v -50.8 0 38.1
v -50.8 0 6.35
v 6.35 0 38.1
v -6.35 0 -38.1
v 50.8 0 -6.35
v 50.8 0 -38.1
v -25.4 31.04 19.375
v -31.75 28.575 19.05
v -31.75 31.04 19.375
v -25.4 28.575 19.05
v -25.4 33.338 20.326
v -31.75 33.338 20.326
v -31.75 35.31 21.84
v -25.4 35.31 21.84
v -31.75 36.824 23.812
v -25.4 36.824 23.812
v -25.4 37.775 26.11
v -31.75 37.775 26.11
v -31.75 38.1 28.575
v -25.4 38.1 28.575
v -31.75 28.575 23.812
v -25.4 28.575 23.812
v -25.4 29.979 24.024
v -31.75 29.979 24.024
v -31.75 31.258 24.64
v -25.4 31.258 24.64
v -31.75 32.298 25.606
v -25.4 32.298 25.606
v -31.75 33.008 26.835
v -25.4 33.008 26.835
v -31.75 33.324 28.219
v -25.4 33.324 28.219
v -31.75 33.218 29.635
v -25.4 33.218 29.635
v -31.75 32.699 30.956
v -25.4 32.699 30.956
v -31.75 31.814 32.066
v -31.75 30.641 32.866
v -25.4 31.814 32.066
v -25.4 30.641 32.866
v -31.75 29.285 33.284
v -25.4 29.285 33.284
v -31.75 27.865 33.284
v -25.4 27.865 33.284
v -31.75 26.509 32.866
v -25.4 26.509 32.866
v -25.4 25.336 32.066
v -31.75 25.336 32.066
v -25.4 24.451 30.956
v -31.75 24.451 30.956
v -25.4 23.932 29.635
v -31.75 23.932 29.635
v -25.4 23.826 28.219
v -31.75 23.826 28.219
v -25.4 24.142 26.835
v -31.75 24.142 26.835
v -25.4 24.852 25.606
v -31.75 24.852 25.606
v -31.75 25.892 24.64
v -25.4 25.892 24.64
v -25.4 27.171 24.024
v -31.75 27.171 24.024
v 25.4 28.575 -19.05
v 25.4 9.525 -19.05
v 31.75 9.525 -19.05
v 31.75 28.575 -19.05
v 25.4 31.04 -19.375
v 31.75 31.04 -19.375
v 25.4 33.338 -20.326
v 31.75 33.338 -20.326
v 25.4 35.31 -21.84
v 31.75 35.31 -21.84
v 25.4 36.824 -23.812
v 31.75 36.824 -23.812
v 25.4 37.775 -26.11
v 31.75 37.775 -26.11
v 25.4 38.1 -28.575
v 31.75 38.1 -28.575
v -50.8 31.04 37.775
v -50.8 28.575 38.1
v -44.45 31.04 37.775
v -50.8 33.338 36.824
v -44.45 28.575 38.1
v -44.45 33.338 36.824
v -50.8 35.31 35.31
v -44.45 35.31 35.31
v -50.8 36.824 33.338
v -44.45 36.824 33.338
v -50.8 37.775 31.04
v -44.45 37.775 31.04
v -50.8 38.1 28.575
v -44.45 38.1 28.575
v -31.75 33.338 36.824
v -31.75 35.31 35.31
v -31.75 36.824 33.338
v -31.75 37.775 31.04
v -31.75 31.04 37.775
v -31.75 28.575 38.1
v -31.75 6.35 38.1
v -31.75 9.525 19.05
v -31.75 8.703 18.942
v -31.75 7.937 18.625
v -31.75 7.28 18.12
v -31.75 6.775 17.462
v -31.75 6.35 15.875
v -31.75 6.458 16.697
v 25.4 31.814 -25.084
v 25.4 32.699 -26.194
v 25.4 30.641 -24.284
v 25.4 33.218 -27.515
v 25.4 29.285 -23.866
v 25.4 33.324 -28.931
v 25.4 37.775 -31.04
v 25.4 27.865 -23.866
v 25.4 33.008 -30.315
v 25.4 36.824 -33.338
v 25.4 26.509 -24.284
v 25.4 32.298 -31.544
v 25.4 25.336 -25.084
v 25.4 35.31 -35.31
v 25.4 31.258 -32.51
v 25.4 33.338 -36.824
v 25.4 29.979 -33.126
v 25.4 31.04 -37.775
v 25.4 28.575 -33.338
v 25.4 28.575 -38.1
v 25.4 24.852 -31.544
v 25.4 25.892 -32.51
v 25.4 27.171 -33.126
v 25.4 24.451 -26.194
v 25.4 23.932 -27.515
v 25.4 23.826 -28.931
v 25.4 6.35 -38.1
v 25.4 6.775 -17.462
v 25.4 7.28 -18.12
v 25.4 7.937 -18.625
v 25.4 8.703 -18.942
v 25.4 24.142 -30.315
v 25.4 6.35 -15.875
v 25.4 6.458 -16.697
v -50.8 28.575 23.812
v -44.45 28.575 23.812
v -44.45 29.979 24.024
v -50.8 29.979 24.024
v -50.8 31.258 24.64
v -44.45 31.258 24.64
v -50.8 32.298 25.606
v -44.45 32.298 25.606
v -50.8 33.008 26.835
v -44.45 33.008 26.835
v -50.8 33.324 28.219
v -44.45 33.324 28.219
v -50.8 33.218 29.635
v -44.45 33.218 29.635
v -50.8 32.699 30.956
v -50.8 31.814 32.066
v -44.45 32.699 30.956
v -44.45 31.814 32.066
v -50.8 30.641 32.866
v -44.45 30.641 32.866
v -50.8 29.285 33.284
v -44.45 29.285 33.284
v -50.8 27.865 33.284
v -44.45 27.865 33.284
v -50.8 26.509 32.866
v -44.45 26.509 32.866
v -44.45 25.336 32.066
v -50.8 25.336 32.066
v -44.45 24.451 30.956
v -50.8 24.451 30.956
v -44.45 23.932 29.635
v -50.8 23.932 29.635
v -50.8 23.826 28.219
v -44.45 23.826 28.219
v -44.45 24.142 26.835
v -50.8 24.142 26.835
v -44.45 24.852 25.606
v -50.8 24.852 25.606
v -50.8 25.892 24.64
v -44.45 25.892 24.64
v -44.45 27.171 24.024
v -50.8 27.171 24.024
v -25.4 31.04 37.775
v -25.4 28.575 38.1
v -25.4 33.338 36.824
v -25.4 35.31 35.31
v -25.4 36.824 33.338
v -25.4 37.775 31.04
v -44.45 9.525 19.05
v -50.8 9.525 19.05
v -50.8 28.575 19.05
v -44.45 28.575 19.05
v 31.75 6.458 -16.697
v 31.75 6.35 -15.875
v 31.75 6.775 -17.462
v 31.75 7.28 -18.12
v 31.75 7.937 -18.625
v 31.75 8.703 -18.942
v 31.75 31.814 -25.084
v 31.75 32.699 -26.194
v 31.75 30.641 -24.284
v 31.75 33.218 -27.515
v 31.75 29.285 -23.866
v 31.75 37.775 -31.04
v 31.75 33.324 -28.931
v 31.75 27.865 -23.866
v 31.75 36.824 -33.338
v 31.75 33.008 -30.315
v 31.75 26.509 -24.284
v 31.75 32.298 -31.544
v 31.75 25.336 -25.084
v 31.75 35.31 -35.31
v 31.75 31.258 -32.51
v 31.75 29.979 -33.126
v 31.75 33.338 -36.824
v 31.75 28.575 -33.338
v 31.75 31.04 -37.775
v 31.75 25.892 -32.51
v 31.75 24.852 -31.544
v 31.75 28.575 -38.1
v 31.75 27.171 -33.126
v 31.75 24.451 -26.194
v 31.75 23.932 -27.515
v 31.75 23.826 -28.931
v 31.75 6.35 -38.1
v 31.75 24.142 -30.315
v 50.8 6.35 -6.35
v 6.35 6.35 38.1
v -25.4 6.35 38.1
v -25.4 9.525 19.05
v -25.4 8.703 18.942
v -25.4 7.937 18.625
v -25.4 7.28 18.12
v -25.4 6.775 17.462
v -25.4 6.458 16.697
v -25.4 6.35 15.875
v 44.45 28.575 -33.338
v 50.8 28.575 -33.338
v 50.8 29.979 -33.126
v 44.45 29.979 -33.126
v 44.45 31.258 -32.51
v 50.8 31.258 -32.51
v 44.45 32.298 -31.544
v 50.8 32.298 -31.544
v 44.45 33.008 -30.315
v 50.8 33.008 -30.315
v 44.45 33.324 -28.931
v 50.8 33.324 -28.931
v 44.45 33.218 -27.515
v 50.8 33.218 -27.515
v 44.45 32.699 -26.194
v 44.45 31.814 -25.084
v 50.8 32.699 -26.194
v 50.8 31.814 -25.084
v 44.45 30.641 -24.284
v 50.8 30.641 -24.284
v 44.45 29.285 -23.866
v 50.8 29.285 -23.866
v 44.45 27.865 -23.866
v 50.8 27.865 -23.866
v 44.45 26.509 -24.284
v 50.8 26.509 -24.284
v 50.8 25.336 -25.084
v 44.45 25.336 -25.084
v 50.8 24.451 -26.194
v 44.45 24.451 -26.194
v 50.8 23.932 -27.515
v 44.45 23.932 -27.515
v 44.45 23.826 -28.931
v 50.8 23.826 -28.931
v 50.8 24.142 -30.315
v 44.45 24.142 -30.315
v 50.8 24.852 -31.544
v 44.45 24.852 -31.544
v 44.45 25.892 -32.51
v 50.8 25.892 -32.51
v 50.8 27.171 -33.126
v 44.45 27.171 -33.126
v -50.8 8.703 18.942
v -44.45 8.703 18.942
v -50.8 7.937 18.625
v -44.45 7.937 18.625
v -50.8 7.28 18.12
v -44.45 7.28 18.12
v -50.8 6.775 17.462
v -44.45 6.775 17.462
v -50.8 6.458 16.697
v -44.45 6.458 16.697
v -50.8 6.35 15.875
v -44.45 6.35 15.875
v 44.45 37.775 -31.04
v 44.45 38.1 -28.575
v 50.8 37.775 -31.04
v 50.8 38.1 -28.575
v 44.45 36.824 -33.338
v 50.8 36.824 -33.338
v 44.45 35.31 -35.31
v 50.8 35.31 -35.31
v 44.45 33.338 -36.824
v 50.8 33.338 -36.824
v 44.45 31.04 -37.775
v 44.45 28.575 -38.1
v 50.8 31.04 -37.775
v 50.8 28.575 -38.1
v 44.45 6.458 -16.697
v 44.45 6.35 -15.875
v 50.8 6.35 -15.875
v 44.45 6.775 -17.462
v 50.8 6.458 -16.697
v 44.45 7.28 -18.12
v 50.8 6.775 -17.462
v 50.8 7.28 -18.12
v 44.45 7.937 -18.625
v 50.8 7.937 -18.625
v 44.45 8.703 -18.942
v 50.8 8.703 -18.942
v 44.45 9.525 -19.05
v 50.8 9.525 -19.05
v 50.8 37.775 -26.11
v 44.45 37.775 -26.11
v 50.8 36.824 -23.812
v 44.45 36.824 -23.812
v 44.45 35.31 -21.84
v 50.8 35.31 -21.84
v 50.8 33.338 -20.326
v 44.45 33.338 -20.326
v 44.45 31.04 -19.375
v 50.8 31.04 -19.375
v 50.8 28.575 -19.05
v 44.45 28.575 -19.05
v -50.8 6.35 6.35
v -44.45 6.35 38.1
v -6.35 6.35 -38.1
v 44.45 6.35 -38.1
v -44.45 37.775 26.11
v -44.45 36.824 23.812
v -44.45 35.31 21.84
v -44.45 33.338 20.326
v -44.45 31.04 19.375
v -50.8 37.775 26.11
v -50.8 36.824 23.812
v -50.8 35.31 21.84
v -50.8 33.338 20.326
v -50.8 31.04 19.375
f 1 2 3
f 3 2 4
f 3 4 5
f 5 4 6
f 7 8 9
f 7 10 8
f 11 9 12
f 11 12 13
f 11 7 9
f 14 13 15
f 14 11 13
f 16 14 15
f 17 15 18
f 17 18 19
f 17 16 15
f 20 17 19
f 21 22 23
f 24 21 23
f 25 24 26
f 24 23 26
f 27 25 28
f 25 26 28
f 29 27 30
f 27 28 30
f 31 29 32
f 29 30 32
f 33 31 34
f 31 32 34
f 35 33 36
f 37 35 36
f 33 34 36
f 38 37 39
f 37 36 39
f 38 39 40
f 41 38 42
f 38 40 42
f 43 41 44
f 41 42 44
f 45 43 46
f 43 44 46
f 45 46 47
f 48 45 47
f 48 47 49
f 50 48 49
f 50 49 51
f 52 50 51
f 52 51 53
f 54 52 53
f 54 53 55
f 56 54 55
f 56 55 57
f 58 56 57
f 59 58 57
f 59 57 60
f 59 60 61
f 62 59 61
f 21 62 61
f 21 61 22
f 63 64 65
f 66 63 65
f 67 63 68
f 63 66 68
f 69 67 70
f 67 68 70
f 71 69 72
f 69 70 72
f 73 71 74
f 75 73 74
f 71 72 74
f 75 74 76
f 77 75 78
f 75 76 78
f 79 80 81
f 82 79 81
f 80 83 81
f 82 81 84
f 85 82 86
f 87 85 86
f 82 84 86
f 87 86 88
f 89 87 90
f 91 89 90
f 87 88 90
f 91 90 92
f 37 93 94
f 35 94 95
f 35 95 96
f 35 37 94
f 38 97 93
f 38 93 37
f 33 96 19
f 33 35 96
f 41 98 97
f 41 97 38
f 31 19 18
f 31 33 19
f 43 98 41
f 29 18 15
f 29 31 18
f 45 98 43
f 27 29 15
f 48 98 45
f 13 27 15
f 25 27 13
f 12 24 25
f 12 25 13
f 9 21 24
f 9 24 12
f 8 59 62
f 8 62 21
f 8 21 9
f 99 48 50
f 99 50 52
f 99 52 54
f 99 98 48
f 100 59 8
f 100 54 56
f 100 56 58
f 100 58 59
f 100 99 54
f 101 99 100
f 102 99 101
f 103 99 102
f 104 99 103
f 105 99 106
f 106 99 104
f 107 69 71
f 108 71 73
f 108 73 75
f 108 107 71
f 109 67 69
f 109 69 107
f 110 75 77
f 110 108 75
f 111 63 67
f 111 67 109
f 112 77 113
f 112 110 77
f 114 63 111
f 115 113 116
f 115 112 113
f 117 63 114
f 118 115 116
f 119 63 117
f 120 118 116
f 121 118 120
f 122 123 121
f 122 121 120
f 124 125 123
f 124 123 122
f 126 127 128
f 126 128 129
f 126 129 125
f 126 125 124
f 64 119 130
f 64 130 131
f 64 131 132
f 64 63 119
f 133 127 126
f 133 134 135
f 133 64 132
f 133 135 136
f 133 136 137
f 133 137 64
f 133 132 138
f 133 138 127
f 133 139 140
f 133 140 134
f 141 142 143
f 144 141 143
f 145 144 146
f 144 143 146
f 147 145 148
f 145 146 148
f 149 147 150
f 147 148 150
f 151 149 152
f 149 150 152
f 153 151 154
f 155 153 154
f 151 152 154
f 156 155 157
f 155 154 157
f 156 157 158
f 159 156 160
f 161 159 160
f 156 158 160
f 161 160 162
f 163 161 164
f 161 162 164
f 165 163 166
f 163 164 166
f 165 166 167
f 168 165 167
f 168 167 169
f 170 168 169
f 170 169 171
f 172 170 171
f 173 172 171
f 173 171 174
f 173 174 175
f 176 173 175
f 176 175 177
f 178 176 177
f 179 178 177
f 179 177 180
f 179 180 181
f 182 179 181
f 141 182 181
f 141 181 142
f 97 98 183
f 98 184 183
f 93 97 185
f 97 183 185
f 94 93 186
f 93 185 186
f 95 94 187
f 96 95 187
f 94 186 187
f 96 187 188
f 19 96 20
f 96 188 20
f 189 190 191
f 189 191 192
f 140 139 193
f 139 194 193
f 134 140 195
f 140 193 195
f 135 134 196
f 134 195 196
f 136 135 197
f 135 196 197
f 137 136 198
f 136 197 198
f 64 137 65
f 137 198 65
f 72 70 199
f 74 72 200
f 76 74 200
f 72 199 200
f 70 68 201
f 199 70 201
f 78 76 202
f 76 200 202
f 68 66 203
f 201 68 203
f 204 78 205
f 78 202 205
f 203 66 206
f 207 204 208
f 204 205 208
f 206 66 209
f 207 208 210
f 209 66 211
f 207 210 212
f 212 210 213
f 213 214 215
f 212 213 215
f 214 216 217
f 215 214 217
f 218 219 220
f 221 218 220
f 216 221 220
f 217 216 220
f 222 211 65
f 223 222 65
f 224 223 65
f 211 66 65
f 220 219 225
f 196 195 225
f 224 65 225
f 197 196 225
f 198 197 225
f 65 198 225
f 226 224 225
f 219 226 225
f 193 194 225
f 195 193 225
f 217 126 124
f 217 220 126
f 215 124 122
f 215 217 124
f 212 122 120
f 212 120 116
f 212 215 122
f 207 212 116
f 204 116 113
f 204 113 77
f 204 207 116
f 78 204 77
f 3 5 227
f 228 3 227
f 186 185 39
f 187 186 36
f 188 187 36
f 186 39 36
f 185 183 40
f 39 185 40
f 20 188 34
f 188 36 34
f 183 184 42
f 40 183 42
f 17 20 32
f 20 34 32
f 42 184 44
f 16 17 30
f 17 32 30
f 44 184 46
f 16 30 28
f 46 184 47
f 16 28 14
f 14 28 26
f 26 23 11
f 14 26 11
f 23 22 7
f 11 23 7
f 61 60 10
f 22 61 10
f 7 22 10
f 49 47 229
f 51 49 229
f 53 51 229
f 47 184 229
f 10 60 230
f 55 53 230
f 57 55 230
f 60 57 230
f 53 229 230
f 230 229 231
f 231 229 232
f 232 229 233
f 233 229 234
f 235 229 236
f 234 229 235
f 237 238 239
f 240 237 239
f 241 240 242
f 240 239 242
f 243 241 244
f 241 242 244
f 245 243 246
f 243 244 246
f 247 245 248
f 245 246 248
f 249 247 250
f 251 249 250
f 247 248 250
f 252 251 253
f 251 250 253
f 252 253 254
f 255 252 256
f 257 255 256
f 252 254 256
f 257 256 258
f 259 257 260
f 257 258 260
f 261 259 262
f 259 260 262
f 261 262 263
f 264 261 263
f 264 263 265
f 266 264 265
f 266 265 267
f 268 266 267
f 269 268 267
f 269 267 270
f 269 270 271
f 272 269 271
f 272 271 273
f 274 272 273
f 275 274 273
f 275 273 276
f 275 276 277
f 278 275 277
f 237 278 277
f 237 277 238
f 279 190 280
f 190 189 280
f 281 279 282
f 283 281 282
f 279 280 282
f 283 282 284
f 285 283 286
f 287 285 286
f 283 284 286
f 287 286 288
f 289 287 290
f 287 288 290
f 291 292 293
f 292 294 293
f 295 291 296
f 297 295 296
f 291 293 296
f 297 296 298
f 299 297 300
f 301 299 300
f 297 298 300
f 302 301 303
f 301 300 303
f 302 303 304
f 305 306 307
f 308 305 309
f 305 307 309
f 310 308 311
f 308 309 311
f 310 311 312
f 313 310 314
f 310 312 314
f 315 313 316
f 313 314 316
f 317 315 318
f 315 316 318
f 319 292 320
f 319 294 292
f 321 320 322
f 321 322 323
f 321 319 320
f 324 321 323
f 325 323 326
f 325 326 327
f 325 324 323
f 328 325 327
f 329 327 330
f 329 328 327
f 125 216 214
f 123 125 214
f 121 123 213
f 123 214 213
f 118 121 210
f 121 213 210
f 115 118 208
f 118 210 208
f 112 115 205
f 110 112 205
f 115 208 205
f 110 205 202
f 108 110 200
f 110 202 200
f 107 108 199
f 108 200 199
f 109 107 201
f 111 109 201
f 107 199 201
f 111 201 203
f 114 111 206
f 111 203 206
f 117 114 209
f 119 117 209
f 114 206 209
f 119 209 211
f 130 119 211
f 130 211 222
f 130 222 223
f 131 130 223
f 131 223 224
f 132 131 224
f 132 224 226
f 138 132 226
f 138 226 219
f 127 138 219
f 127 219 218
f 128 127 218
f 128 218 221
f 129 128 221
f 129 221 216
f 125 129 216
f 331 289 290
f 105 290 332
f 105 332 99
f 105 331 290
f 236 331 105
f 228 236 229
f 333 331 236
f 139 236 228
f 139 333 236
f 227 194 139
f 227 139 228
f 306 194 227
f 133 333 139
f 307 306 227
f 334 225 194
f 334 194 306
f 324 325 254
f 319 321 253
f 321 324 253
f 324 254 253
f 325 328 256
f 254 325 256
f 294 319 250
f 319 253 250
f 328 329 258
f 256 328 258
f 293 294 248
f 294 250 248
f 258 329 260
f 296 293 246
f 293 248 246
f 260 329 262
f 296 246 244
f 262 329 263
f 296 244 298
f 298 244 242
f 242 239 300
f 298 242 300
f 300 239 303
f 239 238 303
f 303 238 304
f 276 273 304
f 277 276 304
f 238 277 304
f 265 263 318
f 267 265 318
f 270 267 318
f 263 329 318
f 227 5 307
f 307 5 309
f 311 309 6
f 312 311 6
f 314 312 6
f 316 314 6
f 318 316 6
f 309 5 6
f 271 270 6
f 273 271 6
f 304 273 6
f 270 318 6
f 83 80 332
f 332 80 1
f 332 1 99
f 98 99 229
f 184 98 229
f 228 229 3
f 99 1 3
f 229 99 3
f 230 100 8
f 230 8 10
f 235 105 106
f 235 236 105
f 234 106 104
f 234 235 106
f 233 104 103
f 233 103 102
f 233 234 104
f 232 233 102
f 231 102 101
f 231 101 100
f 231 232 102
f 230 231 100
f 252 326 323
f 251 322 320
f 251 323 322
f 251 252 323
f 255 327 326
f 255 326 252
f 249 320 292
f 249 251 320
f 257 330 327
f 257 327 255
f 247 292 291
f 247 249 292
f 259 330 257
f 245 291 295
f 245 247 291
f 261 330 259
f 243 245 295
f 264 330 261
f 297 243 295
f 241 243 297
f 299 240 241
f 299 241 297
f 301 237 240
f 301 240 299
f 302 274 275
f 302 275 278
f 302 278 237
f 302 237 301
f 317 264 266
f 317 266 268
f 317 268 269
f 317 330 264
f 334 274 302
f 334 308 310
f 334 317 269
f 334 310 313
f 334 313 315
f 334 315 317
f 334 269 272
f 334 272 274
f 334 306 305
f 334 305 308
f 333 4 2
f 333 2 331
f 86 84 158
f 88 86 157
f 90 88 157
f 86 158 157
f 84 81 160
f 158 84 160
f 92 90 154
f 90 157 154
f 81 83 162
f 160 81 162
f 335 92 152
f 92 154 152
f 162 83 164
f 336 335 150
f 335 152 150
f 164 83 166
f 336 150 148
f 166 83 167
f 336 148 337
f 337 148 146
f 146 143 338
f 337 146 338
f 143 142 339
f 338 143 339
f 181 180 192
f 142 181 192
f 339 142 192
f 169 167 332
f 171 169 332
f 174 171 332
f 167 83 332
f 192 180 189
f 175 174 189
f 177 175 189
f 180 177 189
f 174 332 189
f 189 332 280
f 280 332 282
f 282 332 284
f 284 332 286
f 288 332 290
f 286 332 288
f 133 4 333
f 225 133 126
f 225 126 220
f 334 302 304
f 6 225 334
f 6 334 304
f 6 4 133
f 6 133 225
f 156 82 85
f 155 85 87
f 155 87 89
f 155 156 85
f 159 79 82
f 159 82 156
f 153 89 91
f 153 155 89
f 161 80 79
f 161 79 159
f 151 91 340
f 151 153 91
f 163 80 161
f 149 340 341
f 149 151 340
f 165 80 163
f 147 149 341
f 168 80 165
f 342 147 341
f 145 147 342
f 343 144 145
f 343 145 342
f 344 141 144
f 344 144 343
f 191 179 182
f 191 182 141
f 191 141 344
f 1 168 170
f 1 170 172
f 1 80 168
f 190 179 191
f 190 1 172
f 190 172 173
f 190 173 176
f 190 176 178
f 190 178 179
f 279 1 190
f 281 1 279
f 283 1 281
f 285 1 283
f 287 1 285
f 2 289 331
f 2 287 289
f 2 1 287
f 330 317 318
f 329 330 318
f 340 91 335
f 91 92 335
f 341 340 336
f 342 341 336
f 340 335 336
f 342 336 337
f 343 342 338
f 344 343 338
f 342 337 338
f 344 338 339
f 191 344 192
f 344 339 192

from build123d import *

# Parameters (mm, degrees)
SKETCH1_W           = 101.6
SKETCH1_H           = 76.2
BOSS_EXTRUDE1_DEPTH = 6.35
SKETCH2_W           = 6.35
SKETCH2_H           = 19.05
BOSS_EXTRUDE2_DEPTH = 31.75
SKETCH3_R           = 4.7625
CUT_EXTRUDE1_DEPTH  = 116.003391254
FILLET1_R           = 3.175
FILLET2_R           = 9.525
CHAMFER1_SIZE       = 44.45


with BuildPart() as part:
    # Sketch1 → Boss-Extrude1 (new body)
    with BuildSketch(Plane(origin=(0, 0, 0), x_dir=(1, 0, 0), z_dir=(0, 1, 0))):
        Rectangle(SKETCH1_W, SKETCH1_H)
    extrude(amount=BOSS_EXTRUDE1_DEPTH)

    # Sketch2 → Boss-Extrude2 (add)
    with BuildSketch(Plane(origin=(0, 6.35, 0), x_dir=(1, 0, 0), z_dir=(0, 1, 0))):
        with Locations((-47.625, -28.575)):
            Rectangle(SKETCH2_W, SKETCH2_H)
        with Locations((-28.575, -28.575)):
            Rectangle(SKETCH2_W, SKETCH2_H)
        with Locations((28.575, 28.575)):
            Rectangle(SKETCH2_W, SKETCH2_H)
        with Locations((47.625, 28.575)):
            Rectangle(SKETCH2_W, SKETCH2_H)
    extrude(amount=BOSS_EXTRUDE2_DEPTH)

    # Sketch3 → Cut-Extrude1 (cut, through all)
    with BuildSketch(Plane(origin=(50.8, 0, 0), x_dir=(0, 0, -1), z_dir=(1, 0, 0))):
        with Locations((28.575, 28.575)):
            Circle(SKETCH3_R)
        with Locations((-28.575, 28.575)):
            Circle(SKETCH3_R)
    extrude(amount=-CUT_EXTRUDE1_DEPTH, mode=Mode.SUBTRACT)

    # Fillet1
    fillet1_edges = [part.edges().sort_by_distance(p)[0] for p in [
        (-47.625, 6.35, 19.05),
        (-28.575, 6.35, 19.05),
        (28.575, 6.35, -19.05),
        (47.625, 6.35, -19.05),
    ]]
    fillet(fillet1_edges, radius=FILLET1_R)

    # Fillet2
    fillet2_edges = [part.edges().sort_by_distance(p)[0] for p in [
        (28.575, 38.1, -38.1),
        (47.625, 38.1, -38.1),
        (-47.625, 38.1, 19.05),
        (-47.625, 38.1, 38.1),
        (-28.575, 38.1, 19.05),
        (-28.575, 38.1, 38.1),
        (28.575, 38.1, -19.05),
        (47.625, 38.1, -19.05),
    ]]
    fillet(fillet2_edges, radius=FILLET2_R - 0.0001)  # a hair under: the kernel refuses the full size

    # Chamfer1
    chamfer1_edges = [part.edges().sort_by_distance(p)[0] for p in [
        (-50.8, 3.175, -38.1),
        (50.8, 3.175, 38.1),
    ]]
    chamfer(chamfer1_edges, length=CHAMFER1_SIZE)


solid = part.part
